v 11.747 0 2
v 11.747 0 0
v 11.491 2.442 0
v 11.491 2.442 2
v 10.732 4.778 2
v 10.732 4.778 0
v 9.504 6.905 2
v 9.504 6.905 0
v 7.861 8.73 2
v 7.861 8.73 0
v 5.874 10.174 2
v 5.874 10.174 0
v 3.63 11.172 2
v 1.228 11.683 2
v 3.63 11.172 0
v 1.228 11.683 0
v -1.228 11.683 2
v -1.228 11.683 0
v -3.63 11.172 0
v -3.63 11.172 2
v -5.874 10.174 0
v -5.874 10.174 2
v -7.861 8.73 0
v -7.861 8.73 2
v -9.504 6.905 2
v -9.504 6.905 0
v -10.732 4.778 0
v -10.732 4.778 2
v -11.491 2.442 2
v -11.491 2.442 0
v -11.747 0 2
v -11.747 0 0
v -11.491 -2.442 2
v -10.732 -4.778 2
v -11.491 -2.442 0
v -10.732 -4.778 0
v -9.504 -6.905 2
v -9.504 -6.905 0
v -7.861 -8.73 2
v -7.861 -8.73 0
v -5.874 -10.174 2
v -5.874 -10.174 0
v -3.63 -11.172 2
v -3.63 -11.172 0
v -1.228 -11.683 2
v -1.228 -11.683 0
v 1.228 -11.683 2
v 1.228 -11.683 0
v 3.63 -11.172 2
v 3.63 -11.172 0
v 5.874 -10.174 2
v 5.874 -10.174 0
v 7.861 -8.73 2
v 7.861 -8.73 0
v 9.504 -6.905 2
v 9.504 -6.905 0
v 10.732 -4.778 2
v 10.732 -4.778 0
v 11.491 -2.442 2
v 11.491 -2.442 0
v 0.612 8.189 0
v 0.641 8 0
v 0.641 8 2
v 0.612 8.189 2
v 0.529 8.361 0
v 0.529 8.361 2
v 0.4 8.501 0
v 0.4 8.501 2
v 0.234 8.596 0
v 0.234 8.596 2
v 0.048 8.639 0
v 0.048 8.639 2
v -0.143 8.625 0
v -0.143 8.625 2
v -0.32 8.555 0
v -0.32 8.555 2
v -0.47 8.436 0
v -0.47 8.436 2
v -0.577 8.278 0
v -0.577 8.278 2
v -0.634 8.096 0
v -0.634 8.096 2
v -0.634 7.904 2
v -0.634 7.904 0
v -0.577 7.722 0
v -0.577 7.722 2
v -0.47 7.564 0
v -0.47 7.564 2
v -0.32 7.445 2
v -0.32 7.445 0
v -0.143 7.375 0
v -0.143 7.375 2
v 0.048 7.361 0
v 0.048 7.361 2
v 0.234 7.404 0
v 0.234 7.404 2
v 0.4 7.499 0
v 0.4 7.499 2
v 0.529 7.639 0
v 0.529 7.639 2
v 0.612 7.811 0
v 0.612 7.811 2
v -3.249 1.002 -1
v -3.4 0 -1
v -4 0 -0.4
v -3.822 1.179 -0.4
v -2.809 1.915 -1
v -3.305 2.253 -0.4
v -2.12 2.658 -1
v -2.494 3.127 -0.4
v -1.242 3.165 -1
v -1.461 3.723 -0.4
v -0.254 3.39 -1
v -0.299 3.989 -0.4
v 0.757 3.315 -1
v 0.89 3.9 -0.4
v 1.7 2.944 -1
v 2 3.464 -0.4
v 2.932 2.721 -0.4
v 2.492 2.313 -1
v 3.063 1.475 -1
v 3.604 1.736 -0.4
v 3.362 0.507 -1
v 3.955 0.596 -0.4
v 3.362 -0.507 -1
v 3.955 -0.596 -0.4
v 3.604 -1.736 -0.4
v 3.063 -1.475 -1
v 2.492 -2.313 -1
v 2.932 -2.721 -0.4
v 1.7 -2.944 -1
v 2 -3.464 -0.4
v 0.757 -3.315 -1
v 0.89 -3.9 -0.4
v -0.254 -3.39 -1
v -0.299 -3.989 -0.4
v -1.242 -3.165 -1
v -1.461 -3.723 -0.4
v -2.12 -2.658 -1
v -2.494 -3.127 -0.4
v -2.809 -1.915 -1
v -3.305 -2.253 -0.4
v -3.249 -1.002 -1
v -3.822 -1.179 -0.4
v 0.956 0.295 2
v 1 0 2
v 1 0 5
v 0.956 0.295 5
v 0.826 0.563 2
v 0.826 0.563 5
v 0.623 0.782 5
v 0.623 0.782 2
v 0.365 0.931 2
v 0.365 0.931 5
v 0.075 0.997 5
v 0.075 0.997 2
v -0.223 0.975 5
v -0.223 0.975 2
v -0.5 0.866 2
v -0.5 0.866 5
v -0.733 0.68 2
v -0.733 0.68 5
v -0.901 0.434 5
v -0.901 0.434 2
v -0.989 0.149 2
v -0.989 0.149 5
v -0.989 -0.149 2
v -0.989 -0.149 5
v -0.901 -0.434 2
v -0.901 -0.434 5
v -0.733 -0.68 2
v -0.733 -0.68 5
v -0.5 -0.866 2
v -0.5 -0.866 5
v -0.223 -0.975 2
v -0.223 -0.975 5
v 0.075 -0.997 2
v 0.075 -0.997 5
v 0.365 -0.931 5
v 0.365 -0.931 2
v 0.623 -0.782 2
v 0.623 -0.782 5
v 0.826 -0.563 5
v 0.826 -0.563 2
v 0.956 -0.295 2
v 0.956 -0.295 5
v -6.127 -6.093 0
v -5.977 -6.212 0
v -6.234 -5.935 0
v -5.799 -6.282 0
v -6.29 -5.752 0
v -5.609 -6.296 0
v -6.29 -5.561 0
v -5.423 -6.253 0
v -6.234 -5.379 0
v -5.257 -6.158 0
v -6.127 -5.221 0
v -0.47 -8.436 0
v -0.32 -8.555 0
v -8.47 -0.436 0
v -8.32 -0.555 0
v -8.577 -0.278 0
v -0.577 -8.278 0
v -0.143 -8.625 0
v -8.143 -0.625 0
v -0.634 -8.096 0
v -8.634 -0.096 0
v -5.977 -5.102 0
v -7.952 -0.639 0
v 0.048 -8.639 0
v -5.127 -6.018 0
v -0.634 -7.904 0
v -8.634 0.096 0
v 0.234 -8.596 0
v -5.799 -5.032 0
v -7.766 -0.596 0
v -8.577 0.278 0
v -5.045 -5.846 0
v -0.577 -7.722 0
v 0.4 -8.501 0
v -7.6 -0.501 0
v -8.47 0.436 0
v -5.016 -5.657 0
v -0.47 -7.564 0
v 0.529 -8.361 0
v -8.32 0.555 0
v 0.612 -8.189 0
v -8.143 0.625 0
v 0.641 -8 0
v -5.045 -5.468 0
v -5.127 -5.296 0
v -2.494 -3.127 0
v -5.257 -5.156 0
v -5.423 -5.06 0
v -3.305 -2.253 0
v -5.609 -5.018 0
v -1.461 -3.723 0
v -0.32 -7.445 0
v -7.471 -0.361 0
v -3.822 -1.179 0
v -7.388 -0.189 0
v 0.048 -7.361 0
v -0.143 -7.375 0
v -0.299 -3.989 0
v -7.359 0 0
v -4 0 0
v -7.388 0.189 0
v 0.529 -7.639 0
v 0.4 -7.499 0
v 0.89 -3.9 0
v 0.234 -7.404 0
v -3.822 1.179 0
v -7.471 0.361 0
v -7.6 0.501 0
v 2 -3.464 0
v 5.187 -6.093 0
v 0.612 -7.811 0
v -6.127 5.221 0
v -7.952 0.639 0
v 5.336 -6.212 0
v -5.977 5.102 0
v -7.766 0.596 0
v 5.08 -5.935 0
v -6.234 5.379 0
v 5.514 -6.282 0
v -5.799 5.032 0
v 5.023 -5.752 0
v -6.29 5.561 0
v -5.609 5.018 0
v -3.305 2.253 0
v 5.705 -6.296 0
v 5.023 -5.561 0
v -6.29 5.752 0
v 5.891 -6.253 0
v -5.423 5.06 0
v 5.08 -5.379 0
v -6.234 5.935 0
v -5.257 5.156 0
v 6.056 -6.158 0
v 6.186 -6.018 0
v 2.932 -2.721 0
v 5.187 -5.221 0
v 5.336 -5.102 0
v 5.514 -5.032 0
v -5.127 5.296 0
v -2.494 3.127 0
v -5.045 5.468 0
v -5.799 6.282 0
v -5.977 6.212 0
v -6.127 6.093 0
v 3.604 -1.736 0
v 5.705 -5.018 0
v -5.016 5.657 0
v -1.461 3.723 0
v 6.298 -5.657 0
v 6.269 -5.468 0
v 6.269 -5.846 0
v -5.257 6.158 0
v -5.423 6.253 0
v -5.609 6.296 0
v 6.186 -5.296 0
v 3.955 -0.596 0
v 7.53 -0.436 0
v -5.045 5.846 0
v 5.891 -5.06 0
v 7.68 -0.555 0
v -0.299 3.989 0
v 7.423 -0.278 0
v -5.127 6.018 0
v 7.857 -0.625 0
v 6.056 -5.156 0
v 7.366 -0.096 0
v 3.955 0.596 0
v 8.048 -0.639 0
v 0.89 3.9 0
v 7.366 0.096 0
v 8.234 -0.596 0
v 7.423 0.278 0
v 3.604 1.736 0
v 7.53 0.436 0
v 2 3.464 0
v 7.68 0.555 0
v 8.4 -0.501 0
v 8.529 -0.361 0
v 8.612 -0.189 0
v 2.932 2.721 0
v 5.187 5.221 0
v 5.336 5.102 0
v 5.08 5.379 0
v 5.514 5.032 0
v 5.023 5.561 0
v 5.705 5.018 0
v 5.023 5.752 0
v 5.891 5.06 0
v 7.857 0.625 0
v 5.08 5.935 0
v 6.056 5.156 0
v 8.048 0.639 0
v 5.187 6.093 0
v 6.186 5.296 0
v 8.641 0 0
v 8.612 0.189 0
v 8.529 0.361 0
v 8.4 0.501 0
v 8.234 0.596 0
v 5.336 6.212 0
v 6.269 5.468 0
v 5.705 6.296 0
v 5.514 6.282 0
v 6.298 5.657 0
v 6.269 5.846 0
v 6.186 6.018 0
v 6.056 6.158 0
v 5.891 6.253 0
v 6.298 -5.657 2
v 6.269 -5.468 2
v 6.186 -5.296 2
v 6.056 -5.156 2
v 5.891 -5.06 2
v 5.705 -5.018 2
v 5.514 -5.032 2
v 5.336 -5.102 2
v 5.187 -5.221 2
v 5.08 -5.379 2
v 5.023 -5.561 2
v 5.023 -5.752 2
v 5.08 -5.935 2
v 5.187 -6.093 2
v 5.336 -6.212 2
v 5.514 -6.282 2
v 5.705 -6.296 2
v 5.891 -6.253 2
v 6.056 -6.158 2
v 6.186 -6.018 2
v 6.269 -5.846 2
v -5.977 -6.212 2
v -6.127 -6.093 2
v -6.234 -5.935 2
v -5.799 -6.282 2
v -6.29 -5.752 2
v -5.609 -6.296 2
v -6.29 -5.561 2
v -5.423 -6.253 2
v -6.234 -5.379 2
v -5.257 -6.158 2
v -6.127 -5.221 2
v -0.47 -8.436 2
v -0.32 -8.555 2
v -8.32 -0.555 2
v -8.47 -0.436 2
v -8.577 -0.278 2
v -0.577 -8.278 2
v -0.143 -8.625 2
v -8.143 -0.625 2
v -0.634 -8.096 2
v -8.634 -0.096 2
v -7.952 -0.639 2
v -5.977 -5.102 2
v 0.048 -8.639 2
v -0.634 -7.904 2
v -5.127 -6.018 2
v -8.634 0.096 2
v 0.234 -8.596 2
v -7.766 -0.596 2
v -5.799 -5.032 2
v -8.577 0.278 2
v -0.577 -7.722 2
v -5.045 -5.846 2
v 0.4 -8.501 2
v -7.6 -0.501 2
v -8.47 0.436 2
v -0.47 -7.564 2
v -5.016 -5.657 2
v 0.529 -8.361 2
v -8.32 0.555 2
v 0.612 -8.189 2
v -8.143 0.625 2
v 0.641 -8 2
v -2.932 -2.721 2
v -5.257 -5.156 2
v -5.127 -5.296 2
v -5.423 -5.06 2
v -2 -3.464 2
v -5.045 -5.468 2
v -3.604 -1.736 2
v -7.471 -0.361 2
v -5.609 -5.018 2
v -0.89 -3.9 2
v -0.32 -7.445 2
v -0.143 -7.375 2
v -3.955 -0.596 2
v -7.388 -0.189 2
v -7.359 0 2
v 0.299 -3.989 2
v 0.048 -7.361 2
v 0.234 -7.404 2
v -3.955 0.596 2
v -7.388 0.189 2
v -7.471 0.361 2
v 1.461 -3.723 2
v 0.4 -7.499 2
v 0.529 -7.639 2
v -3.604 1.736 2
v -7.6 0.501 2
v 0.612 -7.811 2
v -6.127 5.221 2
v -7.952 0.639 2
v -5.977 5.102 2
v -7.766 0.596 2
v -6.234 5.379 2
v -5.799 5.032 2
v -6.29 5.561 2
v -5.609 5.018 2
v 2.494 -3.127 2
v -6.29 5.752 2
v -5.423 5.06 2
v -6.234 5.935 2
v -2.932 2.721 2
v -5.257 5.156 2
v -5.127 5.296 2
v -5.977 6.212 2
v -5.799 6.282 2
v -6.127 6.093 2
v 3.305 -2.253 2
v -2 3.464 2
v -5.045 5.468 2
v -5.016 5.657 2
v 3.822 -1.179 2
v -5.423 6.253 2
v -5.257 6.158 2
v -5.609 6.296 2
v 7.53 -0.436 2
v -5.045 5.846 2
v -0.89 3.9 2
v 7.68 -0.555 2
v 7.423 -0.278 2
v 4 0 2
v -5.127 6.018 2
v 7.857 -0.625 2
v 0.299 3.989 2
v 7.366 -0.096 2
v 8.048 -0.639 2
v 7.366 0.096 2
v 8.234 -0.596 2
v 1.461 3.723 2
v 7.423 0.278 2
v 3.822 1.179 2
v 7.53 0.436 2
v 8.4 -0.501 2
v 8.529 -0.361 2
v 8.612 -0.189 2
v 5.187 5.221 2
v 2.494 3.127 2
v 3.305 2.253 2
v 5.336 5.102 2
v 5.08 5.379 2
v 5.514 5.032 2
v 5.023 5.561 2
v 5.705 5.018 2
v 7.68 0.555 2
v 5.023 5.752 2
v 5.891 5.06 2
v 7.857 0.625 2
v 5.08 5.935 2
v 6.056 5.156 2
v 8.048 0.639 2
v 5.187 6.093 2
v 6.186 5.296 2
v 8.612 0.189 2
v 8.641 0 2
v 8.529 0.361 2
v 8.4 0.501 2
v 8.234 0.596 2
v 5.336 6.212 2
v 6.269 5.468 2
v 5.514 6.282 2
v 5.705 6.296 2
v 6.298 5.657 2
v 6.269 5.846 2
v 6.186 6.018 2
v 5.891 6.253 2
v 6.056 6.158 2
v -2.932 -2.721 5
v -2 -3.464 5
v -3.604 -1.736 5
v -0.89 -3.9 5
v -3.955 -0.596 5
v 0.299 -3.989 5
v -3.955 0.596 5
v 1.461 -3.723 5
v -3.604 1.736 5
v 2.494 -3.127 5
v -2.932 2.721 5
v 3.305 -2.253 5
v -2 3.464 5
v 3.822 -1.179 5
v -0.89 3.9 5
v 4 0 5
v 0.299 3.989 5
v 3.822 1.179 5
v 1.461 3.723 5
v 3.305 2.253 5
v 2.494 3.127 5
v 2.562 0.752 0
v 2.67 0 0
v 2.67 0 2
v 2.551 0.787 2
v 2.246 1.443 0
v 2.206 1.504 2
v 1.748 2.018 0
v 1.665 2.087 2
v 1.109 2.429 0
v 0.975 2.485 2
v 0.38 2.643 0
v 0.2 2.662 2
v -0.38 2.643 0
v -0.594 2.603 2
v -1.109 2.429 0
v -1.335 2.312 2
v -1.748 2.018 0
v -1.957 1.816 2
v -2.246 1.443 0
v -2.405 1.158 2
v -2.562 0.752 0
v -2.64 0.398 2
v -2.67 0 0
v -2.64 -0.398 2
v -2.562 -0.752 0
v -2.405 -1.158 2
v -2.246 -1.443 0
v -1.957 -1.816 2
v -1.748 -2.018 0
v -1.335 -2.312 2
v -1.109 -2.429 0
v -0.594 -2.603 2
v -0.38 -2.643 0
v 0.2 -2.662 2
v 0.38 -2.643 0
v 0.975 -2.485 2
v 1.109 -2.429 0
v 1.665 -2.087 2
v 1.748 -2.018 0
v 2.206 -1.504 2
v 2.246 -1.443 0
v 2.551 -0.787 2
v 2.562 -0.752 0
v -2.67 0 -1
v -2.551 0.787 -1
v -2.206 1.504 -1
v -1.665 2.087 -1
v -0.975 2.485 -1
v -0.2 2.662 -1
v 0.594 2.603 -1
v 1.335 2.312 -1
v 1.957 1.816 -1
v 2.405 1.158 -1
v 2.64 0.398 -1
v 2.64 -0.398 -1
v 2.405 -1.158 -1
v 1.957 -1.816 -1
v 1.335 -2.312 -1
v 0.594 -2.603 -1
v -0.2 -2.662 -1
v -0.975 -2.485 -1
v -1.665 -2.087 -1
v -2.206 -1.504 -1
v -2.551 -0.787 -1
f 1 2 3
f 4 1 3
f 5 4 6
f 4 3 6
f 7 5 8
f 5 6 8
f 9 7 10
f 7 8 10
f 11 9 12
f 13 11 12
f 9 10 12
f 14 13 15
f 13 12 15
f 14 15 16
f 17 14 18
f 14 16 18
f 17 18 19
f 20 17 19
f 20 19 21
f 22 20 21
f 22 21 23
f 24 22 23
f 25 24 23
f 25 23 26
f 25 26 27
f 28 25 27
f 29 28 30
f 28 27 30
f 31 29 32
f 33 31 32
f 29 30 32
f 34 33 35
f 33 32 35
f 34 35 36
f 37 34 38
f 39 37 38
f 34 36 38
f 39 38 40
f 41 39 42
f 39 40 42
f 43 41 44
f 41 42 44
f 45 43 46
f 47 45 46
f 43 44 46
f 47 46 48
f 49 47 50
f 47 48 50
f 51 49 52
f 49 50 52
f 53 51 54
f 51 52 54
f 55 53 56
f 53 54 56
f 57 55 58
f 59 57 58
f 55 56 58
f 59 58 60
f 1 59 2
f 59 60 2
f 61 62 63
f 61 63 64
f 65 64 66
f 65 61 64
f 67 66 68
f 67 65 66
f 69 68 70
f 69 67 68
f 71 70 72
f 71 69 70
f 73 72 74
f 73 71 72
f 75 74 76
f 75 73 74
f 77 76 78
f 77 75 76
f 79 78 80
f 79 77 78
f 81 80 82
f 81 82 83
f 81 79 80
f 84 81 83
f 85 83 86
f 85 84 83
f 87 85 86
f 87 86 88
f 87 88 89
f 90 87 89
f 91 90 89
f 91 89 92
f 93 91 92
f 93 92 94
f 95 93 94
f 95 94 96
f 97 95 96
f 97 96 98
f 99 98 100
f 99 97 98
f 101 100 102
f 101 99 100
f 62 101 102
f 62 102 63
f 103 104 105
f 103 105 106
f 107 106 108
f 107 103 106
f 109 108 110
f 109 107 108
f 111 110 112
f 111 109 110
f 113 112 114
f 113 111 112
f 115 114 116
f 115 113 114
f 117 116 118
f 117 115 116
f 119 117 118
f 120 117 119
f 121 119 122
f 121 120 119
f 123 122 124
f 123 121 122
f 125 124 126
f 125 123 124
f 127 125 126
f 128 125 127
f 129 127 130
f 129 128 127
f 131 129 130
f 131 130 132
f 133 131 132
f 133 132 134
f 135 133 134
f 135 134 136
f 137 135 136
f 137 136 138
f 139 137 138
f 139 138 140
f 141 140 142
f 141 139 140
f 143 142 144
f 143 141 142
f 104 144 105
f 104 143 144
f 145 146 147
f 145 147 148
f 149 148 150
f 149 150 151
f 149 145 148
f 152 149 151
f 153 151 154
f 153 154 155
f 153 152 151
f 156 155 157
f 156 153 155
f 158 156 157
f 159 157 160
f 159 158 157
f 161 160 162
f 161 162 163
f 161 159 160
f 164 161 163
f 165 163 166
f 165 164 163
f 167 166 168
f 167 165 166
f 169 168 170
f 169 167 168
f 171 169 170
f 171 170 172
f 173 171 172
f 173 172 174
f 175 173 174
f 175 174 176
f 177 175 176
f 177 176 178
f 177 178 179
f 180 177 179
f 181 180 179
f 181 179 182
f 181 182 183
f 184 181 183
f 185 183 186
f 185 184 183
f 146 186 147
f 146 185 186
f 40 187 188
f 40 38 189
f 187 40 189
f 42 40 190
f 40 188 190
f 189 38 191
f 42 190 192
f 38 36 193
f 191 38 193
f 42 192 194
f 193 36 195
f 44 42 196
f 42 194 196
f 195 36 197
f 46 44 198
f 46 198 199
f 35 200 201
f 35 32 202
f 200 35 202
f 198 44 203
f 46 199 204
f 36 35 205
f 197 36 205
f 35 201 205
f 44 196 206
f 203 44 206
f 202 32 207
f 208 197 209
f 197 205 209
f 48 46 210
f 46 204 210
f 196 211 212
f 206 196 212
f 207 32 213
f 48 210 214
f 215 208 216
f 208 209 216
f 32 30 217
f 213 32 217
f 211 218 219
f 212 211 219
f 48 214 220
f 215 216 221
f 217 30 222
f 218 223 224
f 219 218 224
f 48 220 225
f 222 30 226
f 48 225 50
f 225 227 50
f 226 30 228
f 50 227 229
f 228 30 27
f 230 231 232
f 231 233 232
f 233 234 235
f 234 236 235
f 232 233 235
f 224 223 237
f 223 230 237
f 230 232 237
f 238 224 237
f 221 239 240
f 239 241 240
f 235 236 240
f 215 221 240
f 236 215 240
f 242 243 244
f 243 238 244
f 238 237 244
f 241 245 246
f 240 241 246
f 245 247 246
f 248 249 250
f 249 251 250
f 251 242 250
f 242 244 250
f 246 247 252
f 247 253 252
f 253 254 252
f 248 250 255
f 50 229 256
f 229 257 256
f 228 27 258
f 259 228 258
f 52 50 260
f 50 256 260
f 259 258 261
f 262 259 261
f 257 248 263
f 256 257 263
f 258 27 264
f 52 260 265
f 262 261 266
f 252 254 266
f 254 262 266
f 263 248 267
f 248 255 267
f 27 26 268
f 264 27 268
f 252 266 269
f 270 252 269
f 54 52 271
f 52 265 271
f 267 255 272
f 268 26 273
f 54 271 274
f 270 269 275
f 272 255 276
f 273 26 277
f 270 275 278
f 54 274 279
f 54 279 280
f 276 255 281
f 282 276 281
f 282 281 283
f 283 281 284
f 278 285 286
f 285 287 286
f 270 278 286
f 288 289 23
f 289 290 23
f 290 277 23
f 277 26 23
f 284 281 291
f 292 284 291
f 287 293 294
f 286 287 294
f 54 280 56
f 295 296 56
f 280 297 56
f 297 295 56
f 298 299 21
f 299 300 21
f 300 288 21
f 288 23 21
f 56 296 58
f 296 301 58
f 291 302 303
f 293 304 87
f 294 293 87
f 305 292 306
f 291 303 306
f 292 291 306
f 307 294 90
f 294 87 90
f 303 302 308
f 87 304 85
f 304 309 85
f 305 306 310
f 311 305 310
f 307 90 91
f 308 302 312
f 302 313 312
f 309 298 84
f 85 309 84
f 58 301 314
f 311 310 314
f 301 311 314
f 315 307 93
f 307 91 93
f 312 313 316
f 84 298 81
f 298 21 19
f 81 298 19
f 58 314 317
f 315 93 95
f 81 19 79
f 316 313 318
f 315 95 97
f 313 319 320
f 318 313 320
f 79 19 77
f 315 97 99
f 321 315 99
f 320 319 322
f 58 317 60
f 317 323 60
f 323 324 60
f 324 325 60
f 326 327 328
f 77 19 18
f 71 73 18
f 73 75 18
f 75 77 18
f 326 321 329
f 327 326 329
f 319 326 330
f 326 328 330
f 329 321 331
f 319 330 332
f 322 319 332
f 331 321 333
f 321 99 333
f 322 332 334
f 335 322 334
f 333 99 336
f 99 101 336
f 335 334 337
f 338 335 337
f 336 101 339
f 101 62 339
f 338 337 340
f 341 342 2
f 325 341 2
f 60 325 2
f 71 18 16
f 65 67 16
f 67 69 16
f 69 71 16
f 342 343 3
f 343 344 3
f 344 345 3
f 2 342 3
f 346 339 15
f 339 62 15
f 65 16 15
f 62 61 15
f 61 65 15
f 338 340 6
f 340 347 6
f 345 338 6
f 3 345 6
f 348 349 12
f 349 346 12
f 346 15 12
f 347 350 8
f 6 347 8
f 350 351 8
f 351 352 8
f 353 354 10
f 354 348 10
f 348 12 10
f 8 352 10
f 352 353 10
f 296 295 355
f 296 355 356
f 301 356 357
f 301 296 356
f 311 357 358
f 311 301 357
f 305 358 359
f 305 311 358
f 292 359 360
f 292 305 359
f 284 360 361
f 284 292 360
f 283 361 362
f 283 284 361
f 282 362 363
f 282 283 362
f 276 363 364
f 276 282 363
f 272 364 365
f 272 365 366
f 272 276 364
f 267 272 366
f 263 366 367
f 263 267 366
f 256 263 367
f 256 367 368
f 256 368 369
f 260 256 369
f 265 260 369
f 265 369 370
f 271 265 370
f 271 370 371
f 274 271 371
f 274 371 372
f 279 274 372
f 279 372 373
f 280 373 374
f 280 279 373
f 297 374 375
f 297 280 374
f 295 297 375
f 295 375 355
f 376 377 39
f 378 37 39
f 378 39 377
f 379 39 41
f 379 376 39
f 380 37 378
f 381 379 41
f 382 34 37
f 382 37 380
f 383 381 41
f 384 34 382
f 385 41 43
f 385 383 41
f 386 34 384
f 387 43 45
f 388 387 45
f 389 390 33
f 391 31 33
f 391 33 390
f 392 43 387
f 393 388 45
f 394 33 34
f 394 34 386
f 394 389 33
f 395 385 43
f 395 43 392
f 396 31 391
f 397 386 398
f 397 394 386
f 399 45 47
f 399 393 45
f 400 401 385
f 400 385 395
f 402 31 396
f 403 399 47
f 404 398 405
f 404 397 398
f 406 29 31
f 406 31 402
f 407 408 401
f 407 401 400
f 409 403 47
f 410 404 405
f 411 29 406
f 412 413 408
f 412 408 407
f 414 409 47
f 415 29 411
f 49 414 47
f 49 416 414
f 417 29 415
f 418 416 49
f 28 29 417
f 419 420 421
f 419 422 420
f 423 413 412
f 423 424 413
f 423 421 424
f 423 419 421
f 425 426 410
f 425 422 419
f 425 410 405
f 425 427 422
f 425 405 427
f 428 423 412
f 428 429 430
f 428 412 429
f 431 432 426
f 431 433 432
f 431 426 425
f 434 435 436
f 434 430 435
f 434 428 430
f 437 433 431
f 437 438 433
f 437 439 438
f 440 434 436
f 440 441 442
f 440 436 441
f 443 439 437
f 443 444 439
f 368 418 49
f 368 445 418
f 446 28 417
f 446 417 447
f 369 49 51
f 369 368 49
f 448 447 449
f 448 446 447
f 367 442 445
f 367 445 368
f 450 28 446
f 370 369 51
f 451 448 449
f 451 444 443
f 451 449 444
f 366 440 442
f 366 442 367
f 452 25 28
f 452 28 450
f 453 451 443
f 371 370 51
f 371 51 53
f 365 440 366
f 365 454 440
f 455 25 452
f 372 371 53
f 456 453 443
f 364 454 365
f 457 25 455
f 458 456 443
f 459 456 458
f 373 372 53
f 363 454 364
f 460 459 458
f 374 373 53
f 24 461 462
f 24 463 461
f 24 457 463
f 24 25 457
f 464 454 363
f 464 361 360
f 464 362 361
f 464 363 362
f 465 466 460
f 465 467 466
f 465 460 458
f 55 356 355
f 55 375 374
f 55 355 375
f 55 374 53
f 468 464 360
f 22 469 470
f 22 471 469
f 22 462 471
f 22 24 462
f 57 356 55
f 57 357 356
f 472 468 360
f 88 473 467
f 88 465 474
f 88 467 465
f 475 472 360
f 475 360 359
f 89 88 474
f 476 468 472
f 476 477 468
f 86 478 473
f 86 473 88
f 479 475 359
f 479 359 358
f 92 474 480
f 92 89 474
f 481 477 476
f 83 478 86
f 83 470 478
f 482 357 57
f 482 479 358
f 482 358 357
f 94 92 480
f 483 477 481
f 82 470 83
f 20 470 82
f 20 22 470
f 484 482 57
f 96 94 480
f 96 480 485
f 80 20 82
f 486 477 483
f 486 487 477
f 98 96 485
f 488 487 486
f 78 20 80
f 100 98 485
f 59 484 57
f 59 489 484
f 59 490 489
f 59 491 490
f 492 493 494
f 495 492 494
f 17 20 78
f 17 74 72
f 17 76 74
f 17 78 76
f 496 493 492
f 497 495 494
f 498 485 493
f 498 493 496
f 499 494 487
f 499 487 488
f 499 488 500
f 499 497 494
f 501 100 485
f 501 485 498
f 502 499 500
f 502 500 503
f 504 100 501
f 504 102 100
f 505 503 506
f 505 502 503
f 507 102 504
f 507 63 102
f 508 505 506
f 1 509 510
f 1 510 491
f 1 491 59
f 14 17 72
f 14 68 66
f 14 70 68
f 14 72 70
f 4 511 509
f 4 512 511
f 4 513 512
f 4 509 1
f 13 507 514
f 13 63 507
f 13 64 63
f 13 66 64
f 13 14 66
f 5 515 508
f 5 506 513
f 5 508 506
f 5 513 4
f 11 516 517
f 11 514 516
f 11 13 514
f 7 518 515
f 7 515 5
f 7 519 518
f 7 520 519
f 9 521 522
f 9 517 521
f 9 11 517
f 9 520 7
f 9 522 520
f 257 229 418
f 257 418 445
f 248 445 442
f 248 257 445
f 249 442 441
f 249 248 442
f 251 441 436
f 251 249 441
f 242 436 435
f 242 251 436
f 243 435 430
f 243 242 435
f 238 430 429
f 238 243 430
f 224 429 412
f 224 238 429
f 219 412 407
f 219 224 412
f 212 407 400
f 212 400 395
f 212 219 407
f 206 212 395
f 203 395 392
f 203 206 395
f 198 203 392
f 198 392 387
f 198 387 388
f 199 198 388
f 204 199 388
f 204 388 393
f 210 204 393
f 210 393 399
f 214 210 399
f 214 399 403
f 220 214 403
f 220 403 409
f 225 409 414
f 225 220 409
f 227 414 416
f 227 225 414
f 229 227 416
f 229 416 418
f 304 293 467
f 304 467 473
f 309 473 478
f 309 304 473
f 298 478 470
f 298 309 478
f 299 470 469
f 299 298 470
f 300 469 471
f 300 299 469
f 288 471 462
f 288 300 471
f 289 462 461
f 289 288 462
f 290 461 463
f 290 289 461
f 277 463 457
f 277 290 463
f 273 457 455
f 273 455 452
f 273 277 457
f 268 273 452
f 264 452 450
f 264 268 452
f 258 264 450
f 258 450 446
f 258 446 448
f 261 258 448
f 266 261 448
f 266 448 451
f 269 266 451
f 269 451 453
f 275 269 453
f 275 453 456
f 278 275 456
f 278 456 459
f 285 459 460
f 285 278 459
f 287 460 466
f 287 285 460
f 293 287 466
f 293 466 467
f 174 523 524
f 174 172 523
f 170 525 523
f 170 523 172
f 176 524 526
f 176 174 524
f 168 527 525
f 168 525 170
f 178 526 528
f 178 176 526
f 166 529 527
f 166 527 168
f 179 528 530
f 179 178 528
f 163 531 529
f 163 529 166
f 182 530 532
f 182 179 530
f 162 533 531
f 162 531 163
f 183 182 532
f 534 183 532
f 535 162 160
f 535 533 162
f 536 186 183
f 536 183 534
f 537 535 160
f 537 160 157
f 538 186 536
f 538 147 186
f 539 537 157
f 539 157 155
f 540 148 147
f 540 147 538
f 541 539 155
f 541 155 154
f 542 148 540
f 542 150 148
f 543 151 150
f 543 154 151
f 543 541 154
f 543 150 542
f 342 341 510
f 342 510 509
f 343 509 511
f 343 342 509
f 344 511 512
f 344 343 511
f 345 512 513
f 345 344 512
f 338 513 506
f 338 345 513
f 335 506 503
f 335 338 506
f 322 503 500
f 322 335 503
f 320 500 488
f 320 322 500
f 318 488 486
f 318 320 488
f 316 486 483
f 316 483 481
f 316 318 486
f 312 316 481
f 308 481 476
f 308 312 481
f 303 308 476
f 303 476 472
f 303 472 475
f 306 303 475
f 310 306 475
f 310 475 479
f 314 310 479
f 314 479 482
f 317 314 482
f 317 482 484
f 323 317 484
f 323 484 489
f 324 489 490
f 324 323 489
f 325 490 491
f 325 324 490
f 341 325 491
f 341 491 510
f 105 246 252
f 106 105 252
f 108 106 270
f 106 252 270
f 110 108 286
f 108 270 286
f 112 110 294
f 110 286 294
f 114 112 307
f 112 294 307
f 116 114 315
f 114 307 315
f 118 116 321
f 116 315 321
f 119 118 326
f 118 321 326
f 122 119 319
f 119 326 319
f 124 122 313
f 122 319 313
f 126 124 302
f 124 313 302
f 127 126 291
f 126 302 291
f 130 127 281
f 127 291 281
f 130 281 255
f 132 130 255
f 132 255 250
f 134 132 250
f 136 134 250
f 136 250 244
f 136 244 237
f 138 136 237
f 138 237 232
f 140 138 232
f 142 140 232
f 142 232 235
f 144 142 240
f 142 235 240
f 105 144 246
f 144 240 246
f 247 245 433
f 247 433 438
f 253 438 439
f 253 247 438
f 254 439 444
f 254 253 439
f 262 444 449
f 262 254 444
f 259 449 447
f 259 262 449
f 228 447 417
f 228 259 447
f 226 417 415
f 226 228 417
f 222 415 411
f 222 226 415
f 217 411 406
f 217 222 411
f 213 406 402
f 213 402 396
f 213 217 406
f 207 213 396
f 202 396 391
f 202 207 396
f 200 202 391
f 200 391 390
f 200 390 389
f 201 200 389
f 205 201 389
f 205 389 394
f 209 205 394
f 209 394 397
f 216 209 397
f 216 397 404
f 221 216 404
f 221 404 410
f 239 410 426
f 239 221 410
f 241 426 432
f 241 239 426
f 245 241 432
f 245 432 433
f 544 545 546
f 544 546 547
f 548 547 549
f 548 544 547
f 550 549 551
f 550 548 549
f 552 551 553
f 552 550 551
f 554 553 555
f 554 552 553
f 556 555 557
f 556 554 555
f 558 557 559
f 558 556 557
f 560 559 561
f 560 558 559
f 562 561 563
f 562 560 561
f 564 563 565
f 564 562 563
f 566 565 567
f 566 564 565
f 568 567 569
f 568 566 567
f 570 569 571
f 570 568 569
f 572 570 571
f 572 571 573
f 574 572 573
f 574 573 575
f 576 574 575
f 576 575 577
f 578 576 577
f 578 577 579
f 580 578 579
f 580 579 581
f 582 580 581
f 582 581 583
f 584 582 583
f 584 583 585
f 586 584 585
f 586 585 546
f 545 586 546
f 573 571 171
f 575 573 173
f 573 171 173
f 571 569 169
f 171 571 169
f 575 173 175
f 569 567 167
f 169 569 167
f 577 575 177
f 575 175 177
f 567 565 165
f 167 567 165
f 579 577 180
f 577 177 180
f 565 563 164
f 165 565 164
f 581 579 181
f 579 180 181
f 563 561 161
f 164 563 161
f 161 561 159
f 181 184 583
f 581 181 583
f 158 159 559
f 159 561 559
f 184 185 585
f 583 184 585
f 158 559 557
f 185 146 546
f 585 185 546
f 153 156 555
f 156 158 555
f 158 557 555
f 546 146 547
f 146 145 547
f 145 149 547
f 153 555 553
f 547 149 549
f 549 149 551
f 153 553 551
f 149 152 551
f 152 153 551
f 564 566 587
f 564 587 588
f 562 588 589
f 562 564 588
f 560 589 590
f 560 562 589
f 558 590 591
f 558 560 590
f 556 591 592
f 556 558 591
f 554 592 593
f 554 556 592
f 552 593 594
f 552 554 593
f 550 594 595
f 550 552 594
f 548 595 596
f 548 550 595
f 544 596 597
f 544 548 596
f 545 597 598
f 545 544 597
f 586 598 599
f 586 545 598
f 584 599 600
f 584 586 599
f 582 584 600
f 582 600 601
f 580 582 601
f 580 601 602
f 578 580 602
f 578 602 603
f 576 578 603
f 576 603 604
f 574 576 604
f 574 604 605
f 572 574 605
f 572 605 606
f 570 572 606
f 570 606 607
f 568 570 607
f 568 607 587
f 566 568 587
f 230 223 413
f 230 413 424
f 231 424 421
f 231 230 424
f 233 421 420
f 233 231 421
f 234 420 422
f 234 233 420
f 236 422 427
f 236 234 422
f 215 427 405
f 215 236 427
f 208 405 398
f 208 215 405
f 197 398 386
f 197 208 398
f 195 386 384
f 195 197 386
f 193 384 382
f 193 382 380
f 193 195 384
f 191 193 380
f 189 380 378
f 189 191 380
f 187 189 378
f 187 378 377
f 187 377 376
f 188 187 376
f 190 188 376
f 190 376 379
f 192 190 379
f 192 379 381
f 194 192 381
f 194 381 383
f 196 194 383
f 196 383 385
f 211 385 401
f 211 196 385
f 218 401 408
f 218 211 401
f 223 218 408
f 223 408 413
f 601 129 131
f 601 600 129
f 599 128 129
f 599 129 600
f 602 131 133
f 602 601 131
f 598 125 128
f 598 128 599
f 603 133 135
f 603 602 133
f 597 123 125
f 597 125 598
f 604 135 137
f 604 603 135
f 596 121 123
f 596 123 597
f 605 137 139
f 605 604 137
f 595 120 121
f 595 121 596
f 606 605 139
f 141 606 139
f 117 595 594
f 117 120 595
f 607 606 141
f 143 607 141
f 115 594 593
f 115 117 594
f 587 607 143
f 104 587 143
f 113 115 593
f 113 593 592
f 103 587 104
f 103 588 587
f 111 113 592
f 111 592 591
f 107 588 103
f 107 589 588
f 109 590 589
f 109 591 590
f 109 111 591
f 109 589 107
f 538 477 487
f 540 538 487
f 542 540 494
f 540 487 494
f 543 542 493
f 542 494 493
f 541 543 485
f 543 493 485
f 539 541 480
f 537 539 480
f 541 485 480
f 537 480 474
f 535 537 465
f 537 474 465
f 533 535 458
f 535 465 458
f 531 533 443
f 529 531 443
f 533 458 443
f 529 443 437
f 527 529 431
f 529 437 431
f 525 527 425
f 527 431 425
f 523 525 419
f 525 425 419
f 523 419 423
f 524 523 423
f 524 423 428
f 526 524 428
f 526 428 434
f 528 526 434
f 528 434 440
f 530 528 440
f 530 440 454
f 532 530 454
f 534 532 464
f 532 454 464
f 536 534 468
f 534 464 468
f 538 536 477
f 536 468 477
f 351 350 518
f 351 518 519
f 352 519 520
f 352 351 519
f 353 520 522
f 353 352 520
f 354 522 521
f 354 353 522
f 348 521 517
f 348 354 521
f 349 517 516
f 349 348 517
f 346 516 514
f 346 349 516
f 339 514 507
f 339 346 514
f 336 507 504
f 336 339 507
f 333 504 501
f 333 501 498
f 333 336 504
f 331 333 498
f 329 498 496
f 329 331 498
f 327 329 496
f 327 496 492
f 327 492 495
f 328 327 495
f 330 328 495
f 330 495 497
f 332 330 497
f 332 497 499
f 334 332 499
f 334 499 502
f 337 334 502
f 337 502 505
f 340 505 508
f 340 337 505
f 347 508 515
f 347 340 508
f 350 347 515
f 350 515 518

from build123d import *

# Parameters (mm, degrees)
SKETCH1_R           = 11.747376147
SKETCH1_R_2         = 2.669858215
SKETCH1_R_3         = 0.640765972
BOSS_EXTRUDE1_DEPTH = 2
SKETCH2_R           = 4
SKETCH2_R_2         = 1
BOSS_EXTRUDE2_DEPTH = 3
SKETCH3_R           = 4
SKETCH3_R_2         = 2.669858215
BOSS_EXTRUDE3_DEPTH = 1
CHAMFER1_SIZE       = 0.6


with BuildPart() as part:
    # Sketch1 → Boss-Extrude1 (new body)
    with BuildSketch(Plane.XY):
        Circle(SKETCH1_R)
        Circle(SKETCH1_R_2, mode=Mode.SUBTRACT)
        with Locations((0, 8)):
            Circle(SKETCH1_R_3, mode=Mode.SUBTRACT)
        with Locations((5.656854249, 5.656854249)):
            Circle(SKETCH1_R_3, mode=Mode.SUBTRACT)
        with Locations((8, 0)):
            Circle(SKETCH1_R_3, mode=Mode.SUBTRACT)
        with Locations((5.656854249, -5.656854249)):
            Circle(SKETCH1_R_3, mode=Mode.SUBTRACT)
        with Locations((0, -8)):
            Circle(SKETCH1_R_3, mode=Mode.SUBTRACT)
        with Locations((-5.656854249, -5.656854249)):
            Circle(SKETCH1_R_3, mode=Mode.SUBTRACT)
        with Locations((-8, 0)):
            Circle(SKETCH1_R_3, mode=Mode.SUBTRACT)
        with Locations((-5.656854249, 5.656854249)):
            Circle(SKETCH1_R_3, mode=Mode.SUBTRACT)
    extrude(amount=BOSS_EXTRUDE1_DEPTH)

    # Sketch2 → Boss-Extrude2 (add)
    with BuildSketch(Plane.XY.offset(2)):
        Circle(SKETCH2_R)
        Circle(SKETCH2_R_2, mode=Mode.SUBTRACT)
    extrude(amount=BOSS_EXTRUDE2_DEPTH)

    # Sketch3 → Boss-Extrude3 (add)
    with BuildSketch(Plane(origin=(0, 0, 0), x_dir=(-1, 0, 0), z_dir=(0, 0, -1))):
        Circle(SKETCH3_R)
        Circle(SKETCH3_R_2, mode=Mode.SUBTRACT)
    extrude(amount=BOSS_EXTRUDE3_DEPTH)

    # Chamfer1
    chamfer1_edges = [part.edges().sort_by_distance(p)[0] for p in [
        (4, 0, -1),
    ]]
    chamfer(chamfer1_edges, length=CHAMFER1_SIZE)


solid = part.part
